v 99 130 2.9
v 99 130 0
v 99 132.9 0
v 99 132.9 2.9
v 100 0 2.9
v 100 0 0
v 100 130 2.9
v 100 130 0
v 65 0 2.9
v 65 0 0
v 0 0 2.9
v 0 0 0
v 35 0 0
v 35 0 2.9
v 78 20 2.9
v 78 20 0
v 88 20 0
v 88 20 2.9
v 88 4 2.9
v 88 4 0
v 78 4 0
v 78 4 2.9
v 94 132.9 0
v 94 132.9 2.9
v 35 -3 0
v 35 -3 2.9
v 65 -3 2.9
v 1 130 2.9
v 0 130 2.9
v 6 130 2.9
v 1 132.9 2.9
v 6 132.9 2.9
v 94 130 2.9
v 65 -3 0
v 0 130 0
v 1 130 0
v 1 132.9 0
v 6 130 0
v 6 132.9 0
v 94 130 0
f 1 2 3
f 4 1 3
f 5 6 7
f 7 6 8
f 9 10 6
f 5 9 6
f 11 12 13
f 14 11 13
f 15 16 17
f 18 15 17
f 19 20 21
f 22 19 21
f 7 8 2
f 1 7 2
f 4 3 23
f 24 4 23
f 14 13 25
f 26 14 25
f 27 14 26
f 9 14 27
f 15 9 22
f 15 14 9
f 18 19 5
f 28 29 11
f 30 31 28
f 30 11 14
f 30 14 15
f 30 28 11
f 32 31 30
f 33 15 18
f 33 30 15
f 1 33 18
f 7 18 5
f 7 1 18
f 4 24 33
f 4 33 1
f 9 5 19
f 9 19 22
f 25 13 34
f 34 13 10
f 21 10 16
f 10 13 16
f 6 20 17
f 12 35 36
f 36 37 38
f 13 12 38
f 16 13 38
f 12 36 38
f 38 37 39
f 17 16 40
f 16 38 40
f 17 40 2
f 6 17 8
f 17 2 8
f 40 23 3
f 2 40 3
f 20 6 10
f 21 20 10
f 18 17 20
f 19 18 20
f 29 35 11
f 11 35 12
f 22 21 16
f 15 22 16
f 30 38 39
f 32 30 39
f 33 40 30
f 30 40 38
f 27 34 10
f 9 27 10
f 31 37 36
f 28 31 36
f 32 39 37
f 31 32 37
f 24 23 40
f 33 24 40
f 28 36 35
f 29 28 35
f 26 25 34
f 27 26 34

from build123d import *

# Parameters (mm, degrees)
EXTRUDE_1_DEPTH = 2.9


with BuildPart() as part:
    # 草图1 → 凸台-拉伸1 (new body)
    with BuildSketch(Plane.XY):
        Polygon((65, -3), (65, 0), (100, 0), (100, 130), (99, 130), (99, 132.9), (95, 132.9), (94, 132.9), (94, 130), (6, 130), (6, 132.9), (5, 132.9), (1, 132.9), (1, 130), (0, 130), (0, 0), (35, 0), (35, -3), (50, -3), align=None)
        Polygon((83, 4), (78, 4), (78, 20), (83, 20), (88, 20), (88, 4), align=None, mode=Mode.SUBTRACT)
    extrude(amount=EXTRUDE_1_DEPTH)


solid = part.part
